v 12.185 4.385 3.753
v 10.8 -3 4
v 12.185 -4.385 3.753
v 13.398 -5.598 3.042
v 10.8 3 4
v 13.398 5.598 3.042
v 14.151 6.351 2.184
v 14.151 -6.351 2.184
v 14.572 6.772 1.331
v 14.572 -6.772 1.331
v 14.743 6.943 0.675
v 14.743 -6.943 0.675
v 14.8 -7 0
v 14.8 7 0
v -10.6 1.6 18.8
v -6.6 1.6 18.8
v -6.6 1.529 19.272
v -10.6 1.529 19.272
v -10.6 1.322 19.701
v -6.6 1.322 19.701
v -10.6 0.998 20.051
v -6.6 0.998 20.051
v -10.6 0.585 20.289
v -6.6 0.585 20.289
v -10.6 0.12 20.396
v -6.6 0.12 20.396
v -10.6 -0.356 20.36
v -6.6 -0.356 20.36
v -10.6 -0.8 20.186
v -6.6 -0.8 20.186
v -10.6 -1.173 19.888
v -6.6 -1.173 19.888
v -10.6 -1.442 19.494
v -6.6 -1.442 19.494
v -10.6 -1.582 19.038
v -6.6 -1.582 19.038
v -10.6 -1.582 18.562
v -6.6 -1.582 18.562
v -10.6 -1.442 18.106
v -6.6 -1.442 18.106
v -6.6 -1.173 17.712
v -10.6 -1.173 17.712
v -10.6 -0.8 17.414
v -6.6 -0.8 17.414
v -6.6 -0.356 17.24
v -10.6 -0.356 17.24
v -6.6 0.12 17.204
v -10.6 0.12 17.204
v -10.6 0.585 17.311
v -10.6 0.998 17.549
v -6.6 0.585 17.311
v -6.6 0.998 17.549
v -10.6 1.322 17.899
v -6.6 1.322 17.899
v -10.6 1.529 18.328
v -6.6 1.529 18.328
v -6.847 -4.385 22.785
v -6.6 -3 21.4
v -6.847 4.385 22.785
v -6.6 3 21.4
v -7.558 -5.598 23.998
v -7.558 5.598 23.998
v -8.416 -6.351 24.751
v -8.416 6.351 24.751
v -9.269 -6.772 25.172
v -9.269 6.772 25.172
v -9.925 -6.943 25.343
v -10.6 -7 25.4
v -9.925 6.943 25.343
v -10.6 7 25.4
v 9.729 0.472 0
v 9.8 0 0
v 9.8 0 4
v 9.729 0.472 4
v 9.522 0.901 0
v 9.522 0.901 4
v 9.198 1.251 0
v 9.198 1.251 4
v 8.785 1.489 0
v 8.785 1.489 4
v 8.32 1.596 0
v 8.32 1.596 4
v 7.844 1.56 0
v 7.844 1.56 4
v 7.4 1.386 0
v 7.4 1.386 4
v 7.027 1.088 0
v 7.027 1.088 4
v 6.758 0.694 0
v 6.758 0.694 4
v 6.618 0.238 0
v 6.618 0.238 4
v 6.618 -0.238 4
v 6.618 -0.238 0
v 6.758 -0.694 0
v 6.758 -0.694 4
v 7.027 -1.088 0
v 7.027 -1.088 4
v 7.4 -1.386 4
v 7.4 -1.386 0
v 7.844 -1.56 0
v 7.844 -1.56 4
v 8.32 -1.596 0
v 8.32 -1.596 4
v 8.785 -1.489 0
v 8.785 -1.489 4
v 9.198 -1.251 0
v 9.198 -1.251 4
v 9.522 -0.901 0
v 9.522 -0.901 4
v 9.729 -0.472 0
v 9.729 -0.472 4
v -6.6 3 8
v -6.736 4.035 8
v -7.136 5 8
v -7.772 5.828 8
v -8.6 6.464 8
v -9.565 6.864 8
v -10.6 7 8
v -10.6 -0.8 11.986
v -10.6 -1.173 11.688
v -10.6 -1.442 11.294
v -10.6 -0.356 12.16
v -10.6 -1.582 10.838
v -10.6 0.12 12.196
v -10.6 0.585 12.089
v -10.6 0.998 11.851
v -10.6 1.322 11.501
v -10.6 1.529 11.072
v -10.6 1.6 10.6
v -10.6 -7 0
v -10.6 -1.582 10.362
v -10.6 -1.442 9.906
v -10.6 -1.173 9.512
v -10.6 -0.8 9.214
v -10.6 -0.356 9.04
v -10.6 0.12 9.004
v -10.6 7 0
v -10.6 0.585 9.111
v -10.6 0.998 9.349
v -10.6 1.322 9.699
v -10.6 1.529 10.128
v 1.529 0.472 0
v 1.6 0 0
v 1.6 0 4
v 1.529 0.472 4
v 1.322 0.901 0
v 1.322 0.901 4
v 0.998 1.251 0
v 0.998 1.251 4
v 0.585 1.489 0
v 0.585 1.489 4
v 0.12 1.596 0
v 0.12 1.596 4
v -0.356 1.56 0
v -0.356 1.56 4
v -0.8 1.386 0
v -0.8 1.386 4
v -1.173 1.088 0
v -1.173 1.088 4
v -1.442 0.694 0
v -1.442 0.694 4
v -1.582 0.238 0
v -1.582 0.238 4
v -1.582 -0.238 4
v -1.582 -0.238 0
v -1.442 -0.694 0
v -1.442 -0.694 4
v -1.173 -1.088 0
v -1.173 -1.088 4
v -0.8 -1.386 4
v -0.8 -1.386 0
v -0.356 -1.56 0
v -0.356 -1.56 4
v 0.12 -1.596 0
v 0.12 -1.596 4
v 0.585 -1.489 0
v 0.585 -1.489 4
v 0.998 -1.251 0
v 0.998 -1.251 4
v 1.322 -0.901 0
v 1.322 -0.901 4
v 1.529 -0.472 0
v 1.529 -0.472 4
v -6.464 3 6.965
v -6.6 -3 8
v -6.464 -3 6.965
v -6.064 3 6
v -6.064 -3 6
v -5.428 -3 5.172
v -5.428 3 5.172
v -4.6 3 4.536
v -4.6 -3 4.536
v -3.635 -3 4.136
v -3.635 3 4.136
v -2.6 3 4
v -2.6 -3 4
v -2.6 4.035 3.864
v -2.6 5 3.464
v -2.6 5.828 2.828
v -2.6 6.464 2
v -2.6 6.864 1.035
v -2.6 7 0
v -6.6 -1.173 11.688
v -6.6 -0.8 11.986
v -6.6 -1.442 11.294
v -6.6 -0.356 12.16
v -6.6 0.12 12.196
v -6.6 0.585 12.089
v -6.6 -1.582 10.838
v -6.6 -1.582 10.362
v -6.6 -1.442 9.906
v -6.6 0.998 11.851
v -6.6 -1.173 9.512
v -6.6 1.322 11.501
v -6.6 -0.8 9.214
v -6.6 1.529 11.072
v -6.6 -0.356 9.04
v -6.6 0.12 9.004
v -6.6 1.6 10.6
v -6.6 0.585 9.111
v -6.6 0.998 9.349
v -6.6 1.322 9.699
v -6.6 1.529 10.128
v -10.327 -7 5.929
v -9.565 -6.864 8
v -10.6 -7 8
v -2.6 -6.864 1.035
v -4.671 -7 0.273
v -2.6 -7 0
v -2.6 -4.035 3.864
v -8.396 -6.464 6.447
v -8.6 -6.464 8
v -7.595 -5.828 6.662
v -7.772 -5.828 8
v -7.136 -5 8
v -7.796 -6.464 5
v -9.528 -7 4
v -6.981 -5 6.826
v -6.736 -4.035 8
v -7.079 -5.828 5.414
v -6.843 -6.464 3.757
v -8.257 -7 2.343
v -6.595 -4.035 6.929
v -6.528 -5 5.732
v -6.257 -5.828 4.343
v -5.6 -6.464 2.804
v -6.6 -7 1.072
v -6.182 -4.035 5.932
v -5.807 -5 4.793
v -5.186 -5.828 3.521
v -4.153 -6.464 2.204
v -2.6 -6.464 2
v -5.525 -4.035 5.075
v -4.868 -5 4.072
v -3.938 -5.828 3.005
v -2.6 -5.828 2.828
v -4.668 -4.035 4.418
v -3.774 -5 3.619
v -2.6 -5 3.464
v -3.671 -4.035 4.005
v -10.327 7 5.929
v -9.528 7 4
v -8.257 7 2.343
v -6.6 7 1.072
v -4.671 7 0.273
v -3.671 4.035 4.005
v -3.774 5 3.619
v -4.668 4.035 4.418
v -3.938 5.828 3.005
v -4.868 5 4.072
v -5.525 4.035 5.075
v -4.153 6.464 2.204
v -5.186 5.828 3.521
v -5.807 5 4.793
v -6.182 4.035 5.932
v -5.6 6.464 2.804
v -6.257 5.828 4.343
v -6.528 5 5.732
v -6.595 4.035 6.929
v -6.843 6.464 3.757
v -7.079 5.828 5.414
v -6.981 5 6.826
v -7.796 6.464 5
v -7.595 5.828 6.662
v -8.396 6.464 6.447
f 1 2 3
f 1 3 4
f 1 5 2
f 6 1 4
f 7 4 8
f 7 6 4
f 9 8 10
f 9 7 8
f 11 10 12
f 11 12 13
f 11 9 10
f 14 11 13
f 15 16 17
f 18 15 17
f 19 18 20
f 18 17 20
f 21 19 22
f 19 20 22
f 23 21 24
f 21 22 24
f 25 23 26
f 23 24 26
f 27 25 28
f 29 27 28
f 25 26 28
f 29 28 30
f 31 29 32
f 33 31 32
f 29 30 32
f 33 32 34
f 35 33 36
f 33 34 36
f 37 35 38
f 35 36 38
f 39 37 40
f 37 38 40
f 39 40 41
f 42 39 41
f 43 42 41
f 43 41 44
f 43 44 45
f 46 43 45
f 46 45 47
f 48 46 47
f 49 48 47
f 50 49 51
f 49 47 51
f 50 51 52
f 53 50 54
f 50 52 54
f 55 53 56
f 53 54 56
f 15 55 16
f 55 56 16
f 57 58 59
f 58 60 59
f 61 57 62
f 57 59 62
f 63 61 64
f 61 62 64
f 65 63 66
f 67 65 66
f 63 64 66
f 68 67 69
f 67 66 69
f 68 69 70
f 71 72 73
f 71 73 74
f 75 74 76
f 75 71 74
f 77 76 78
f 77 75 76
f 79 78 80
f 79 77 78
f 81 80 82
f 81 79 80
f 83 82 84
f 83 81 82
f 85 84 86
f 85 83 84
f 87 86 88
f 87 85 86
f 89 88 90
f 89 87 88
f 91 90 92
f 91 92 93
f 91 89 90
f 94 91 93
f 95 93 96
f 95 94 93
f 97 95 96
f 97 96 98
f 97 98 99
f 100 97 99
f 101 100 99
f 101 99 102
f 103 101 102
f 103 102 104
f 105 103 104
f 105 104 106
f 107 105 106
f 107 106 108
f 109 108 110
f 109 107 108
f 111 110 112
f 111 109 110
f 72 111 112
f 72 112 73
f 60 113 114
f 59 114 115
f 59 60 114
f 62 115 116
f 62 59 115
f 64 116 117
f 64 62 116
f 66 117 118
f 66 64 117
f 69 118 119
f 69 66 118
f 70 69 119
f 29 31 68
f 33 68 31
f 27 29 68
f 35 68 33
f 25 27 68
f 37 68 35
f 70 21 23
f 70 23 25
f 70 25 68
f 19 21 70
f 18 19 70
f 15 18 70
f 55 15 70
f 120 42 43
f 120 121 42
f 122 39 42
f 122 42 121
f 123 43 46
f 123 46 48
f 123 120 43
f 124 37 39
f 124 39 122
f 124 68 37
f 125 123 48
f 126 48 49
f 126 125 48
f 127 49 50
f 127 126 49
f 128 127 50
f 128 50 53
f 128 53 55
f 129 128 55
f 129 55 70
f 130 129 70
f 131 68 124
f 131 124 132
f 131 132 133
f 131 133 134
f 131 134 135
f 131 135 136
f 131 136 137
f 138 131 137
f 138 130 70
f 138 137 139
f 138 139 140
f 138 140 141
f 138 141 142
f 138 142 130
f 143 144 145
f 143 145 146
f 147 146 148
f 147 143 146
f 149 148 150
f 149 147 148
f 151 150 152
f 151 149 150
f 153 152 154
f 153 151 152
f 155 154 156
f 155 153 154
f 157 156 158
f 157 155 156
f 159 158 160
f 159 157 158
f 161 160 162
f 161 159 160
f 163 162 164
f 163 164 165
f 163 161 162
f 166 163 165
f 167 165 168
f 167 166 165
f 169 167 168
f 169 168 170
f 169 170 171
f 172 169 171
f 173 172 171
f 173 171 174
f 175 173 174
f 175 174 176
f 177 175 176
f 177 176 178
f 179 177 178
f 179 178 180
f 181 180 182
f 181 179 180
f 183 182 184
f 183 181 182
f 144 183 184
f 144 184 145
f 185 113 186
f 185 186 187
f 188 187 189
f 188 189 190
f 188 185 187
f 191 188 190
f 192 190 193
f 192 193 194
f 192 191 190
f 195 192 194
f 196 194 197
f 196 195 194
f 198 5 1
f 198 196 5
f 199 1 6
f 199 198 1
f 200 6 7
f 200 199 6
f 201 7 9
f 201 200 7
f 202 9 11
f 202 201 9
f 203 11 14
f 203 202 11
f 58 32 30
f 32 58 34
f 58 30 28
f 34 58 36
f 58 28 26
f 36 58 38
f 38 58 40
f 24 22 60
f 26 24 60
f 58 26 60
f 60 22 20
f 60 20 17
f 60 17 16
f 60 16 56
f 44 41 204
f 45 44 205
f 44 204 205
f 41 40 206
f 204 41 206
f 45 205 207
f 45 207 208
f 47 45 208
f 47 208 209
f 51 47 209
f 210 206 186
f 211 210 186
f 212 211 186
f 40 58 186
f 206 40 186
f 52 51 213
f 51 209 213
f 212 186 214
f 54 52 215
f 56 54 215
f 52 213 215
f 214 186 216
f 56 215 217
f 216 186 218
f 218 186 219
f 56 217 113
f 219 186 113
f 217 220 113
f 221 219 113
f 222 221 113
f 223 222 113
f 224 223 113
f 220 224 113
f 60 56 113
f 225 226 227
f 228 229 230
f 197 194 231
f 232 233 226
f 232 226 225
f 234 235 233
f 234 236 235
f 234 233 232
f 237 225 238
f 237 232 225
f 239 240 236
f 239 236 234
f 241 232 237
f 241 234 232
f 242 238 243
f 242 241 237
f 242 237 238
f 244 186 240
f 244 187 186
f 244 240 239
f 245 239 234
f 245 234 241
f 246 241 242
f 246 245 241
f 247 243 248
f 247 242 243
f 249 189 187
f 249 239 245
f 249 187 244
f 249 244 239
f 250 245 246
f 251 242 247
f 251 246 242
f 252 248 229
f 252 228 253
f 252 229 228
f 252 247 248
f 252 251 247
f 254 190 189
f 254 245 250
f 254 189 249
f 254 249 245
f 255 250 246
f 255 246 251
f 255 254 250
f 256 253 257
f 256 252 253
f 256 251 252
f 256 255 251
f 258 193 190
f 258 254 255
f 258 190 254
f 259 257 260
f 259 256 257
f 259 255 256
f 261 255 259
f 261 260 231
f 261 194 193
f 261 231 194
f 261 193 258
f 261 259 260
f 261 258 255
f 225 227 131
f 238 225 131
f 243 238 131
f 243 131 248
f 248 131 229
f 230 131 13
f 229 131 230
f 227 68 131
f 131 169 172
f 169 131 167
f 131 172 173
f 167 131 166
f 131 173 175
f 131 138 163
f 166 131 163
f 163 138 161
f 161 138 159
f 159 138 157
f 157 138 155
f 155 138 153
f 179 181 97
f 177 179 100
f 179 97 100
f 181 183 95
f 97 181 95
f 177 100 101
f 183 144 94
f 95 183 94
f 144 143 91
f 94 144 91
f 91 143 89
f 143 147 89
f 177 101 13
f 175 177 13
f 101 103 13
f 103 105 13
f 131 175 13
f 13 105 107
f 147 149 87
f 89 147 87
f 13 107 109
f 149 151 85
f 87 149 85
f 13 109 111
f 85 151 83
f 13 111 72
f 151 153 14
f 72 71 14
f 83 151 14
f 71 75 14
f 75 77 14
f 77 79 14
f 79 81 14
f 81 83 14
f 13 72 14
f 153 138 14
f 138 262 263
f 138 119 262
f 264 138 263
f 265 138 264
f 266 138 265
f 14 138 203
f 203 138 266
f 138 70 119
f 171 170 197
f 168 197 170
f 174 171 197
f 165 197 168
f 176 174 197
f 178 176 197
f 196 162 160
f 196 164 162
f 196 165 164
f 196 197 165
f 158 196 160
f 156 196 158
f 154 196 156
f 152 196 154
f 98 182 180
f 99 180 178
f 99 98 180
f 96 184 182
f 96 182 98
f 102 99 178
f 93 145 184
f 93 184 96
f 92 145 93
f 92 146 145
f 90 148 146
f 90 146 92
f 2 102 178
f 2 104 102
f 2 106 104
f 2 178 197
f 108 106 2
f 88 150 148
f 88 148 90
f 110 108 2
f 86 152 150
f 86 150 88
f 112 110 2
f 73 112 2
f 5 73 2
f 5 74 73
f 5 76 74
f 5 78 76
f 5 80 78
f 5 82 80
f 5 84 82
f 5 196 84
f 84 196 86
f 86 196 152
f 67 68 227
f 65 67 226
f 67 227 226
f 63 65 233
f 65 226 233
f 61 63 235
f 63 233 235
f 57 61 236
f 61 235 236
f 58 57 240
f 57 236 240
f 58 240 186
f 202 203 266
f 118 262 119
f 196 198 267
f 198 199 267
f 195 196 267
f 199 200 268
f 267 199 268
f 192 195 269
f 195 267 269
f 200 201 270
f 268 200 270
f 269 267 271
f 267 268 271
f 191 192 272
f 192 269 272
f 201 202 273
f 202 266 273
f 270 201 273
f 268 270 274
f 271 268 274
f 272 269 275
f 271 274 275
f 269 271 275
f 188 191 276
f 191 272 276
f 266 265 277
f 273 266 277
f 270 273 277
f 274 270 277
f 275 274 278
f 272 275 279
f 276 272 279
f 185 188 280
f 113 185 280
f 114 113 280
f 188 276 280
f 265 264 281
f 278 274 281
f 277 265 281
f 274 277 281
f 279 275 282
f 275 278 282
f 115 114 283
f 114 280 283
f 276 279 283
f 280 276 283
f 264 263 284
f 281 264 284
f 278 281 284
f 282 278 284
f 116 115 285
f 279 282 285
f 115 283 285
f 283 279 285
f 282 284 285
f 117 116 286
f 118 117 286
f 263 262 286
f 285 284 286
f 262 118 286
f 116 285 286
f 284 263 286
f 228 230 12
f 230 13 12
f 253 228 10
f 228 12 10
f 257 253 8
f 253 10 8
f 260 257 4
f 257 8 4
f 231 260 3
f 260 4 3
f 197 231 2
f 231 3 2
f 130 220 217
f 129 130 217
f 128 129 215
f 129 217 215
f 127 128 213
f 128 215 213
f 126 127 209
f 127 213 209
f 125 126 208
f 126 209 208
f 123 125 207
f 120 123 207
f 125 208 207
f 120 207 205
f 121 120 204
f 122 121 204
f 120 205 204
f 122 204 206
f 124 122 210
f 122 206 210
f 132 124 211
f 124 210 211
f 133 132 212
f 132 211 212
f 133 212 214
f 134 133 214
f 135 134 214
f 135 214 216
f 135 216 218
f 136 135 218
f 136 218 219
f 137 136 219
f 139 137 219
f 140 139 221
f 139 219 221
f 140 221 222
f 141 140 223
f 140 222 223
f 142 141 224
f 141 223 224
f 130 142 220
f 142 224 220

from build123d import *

# Parameters (mm, degrees)
F0_W     = 4
F0_H     = 14
F1_DEPTH = 25.4
F0_W_2   = 21.4
F0_R     = 1.6
F2_DEPTH = 4
F3_R     = 1.6
F4_DEPTH = 4
F5_F1_R  = 4
F5_F2_R  = 3.9999


# Not quite as in the source:
# - a fillet or chamfer is up to 0.001 mm smaller than in the source, because OpenCascade refuses the exact size


with BuildPart() as f1:
    # F0 (on Top) → F1 (new body)
    with BuildSketch(Plane.XY):
        with Locations((-8.6, 0)):
            Rectangle(F0_W, F0_H)
    extrude(amount=F1_DEPTH)

    # F0 (on Top) → F2 (join)
    with BuildSketch(Plane.XY):
        with Locations((4.1, 0)):
            Rectangle(F0_W_2, F0_H)
        Circle(F0_R, mode=Mode.SUBTRACT)
        with Locations((8.2, 0)):
            Circle(F0_R, mode=Mode.SUBTRACT)
    extrude(amount=F2_DEPTH)

    # F3 (on face) → F4 (cut, through all)
    with BuildSketch(Plane.YZ.offset(-6.6)):
        with Locations((0, 18.8)):
            Circle(F3_R)
        with Locations((0, 10.6)):
            Circle(F3_R)
    extrude(amount=-F4_DEPTH, mode=Mode.SUBTRACT)

    # F5: fillet of radius 4 on 5 edges, made by hand

    # F5_f1
    f5_f1_edges = [f1.edges().sort_by_distance(p)[0] for p in [
        (-6.6, 0, 4),
    ]]
    fillet(f5_f1_edges, radius=F5_F1_R)

    # F5_f2 (radius 4 in the source; OpenCascade refuses exactly that, so slightly less here)
    f5_f2_edges = [f1.edges().sort_by_distance(p)[0] for p in [
        (-6.6, 0, 25.4),
        (14.8, 0, 4),
        (-6.6, 7, 16.7),
        (6.1, -7, 4),
        (-5.4284271247, -7, 5.1715728753),
        (-5.4284271247, 7, 5.1715728753),
    ]]
    fillet(f5_f2_edges, radius=F5_F2_R)


solid = f1.part
